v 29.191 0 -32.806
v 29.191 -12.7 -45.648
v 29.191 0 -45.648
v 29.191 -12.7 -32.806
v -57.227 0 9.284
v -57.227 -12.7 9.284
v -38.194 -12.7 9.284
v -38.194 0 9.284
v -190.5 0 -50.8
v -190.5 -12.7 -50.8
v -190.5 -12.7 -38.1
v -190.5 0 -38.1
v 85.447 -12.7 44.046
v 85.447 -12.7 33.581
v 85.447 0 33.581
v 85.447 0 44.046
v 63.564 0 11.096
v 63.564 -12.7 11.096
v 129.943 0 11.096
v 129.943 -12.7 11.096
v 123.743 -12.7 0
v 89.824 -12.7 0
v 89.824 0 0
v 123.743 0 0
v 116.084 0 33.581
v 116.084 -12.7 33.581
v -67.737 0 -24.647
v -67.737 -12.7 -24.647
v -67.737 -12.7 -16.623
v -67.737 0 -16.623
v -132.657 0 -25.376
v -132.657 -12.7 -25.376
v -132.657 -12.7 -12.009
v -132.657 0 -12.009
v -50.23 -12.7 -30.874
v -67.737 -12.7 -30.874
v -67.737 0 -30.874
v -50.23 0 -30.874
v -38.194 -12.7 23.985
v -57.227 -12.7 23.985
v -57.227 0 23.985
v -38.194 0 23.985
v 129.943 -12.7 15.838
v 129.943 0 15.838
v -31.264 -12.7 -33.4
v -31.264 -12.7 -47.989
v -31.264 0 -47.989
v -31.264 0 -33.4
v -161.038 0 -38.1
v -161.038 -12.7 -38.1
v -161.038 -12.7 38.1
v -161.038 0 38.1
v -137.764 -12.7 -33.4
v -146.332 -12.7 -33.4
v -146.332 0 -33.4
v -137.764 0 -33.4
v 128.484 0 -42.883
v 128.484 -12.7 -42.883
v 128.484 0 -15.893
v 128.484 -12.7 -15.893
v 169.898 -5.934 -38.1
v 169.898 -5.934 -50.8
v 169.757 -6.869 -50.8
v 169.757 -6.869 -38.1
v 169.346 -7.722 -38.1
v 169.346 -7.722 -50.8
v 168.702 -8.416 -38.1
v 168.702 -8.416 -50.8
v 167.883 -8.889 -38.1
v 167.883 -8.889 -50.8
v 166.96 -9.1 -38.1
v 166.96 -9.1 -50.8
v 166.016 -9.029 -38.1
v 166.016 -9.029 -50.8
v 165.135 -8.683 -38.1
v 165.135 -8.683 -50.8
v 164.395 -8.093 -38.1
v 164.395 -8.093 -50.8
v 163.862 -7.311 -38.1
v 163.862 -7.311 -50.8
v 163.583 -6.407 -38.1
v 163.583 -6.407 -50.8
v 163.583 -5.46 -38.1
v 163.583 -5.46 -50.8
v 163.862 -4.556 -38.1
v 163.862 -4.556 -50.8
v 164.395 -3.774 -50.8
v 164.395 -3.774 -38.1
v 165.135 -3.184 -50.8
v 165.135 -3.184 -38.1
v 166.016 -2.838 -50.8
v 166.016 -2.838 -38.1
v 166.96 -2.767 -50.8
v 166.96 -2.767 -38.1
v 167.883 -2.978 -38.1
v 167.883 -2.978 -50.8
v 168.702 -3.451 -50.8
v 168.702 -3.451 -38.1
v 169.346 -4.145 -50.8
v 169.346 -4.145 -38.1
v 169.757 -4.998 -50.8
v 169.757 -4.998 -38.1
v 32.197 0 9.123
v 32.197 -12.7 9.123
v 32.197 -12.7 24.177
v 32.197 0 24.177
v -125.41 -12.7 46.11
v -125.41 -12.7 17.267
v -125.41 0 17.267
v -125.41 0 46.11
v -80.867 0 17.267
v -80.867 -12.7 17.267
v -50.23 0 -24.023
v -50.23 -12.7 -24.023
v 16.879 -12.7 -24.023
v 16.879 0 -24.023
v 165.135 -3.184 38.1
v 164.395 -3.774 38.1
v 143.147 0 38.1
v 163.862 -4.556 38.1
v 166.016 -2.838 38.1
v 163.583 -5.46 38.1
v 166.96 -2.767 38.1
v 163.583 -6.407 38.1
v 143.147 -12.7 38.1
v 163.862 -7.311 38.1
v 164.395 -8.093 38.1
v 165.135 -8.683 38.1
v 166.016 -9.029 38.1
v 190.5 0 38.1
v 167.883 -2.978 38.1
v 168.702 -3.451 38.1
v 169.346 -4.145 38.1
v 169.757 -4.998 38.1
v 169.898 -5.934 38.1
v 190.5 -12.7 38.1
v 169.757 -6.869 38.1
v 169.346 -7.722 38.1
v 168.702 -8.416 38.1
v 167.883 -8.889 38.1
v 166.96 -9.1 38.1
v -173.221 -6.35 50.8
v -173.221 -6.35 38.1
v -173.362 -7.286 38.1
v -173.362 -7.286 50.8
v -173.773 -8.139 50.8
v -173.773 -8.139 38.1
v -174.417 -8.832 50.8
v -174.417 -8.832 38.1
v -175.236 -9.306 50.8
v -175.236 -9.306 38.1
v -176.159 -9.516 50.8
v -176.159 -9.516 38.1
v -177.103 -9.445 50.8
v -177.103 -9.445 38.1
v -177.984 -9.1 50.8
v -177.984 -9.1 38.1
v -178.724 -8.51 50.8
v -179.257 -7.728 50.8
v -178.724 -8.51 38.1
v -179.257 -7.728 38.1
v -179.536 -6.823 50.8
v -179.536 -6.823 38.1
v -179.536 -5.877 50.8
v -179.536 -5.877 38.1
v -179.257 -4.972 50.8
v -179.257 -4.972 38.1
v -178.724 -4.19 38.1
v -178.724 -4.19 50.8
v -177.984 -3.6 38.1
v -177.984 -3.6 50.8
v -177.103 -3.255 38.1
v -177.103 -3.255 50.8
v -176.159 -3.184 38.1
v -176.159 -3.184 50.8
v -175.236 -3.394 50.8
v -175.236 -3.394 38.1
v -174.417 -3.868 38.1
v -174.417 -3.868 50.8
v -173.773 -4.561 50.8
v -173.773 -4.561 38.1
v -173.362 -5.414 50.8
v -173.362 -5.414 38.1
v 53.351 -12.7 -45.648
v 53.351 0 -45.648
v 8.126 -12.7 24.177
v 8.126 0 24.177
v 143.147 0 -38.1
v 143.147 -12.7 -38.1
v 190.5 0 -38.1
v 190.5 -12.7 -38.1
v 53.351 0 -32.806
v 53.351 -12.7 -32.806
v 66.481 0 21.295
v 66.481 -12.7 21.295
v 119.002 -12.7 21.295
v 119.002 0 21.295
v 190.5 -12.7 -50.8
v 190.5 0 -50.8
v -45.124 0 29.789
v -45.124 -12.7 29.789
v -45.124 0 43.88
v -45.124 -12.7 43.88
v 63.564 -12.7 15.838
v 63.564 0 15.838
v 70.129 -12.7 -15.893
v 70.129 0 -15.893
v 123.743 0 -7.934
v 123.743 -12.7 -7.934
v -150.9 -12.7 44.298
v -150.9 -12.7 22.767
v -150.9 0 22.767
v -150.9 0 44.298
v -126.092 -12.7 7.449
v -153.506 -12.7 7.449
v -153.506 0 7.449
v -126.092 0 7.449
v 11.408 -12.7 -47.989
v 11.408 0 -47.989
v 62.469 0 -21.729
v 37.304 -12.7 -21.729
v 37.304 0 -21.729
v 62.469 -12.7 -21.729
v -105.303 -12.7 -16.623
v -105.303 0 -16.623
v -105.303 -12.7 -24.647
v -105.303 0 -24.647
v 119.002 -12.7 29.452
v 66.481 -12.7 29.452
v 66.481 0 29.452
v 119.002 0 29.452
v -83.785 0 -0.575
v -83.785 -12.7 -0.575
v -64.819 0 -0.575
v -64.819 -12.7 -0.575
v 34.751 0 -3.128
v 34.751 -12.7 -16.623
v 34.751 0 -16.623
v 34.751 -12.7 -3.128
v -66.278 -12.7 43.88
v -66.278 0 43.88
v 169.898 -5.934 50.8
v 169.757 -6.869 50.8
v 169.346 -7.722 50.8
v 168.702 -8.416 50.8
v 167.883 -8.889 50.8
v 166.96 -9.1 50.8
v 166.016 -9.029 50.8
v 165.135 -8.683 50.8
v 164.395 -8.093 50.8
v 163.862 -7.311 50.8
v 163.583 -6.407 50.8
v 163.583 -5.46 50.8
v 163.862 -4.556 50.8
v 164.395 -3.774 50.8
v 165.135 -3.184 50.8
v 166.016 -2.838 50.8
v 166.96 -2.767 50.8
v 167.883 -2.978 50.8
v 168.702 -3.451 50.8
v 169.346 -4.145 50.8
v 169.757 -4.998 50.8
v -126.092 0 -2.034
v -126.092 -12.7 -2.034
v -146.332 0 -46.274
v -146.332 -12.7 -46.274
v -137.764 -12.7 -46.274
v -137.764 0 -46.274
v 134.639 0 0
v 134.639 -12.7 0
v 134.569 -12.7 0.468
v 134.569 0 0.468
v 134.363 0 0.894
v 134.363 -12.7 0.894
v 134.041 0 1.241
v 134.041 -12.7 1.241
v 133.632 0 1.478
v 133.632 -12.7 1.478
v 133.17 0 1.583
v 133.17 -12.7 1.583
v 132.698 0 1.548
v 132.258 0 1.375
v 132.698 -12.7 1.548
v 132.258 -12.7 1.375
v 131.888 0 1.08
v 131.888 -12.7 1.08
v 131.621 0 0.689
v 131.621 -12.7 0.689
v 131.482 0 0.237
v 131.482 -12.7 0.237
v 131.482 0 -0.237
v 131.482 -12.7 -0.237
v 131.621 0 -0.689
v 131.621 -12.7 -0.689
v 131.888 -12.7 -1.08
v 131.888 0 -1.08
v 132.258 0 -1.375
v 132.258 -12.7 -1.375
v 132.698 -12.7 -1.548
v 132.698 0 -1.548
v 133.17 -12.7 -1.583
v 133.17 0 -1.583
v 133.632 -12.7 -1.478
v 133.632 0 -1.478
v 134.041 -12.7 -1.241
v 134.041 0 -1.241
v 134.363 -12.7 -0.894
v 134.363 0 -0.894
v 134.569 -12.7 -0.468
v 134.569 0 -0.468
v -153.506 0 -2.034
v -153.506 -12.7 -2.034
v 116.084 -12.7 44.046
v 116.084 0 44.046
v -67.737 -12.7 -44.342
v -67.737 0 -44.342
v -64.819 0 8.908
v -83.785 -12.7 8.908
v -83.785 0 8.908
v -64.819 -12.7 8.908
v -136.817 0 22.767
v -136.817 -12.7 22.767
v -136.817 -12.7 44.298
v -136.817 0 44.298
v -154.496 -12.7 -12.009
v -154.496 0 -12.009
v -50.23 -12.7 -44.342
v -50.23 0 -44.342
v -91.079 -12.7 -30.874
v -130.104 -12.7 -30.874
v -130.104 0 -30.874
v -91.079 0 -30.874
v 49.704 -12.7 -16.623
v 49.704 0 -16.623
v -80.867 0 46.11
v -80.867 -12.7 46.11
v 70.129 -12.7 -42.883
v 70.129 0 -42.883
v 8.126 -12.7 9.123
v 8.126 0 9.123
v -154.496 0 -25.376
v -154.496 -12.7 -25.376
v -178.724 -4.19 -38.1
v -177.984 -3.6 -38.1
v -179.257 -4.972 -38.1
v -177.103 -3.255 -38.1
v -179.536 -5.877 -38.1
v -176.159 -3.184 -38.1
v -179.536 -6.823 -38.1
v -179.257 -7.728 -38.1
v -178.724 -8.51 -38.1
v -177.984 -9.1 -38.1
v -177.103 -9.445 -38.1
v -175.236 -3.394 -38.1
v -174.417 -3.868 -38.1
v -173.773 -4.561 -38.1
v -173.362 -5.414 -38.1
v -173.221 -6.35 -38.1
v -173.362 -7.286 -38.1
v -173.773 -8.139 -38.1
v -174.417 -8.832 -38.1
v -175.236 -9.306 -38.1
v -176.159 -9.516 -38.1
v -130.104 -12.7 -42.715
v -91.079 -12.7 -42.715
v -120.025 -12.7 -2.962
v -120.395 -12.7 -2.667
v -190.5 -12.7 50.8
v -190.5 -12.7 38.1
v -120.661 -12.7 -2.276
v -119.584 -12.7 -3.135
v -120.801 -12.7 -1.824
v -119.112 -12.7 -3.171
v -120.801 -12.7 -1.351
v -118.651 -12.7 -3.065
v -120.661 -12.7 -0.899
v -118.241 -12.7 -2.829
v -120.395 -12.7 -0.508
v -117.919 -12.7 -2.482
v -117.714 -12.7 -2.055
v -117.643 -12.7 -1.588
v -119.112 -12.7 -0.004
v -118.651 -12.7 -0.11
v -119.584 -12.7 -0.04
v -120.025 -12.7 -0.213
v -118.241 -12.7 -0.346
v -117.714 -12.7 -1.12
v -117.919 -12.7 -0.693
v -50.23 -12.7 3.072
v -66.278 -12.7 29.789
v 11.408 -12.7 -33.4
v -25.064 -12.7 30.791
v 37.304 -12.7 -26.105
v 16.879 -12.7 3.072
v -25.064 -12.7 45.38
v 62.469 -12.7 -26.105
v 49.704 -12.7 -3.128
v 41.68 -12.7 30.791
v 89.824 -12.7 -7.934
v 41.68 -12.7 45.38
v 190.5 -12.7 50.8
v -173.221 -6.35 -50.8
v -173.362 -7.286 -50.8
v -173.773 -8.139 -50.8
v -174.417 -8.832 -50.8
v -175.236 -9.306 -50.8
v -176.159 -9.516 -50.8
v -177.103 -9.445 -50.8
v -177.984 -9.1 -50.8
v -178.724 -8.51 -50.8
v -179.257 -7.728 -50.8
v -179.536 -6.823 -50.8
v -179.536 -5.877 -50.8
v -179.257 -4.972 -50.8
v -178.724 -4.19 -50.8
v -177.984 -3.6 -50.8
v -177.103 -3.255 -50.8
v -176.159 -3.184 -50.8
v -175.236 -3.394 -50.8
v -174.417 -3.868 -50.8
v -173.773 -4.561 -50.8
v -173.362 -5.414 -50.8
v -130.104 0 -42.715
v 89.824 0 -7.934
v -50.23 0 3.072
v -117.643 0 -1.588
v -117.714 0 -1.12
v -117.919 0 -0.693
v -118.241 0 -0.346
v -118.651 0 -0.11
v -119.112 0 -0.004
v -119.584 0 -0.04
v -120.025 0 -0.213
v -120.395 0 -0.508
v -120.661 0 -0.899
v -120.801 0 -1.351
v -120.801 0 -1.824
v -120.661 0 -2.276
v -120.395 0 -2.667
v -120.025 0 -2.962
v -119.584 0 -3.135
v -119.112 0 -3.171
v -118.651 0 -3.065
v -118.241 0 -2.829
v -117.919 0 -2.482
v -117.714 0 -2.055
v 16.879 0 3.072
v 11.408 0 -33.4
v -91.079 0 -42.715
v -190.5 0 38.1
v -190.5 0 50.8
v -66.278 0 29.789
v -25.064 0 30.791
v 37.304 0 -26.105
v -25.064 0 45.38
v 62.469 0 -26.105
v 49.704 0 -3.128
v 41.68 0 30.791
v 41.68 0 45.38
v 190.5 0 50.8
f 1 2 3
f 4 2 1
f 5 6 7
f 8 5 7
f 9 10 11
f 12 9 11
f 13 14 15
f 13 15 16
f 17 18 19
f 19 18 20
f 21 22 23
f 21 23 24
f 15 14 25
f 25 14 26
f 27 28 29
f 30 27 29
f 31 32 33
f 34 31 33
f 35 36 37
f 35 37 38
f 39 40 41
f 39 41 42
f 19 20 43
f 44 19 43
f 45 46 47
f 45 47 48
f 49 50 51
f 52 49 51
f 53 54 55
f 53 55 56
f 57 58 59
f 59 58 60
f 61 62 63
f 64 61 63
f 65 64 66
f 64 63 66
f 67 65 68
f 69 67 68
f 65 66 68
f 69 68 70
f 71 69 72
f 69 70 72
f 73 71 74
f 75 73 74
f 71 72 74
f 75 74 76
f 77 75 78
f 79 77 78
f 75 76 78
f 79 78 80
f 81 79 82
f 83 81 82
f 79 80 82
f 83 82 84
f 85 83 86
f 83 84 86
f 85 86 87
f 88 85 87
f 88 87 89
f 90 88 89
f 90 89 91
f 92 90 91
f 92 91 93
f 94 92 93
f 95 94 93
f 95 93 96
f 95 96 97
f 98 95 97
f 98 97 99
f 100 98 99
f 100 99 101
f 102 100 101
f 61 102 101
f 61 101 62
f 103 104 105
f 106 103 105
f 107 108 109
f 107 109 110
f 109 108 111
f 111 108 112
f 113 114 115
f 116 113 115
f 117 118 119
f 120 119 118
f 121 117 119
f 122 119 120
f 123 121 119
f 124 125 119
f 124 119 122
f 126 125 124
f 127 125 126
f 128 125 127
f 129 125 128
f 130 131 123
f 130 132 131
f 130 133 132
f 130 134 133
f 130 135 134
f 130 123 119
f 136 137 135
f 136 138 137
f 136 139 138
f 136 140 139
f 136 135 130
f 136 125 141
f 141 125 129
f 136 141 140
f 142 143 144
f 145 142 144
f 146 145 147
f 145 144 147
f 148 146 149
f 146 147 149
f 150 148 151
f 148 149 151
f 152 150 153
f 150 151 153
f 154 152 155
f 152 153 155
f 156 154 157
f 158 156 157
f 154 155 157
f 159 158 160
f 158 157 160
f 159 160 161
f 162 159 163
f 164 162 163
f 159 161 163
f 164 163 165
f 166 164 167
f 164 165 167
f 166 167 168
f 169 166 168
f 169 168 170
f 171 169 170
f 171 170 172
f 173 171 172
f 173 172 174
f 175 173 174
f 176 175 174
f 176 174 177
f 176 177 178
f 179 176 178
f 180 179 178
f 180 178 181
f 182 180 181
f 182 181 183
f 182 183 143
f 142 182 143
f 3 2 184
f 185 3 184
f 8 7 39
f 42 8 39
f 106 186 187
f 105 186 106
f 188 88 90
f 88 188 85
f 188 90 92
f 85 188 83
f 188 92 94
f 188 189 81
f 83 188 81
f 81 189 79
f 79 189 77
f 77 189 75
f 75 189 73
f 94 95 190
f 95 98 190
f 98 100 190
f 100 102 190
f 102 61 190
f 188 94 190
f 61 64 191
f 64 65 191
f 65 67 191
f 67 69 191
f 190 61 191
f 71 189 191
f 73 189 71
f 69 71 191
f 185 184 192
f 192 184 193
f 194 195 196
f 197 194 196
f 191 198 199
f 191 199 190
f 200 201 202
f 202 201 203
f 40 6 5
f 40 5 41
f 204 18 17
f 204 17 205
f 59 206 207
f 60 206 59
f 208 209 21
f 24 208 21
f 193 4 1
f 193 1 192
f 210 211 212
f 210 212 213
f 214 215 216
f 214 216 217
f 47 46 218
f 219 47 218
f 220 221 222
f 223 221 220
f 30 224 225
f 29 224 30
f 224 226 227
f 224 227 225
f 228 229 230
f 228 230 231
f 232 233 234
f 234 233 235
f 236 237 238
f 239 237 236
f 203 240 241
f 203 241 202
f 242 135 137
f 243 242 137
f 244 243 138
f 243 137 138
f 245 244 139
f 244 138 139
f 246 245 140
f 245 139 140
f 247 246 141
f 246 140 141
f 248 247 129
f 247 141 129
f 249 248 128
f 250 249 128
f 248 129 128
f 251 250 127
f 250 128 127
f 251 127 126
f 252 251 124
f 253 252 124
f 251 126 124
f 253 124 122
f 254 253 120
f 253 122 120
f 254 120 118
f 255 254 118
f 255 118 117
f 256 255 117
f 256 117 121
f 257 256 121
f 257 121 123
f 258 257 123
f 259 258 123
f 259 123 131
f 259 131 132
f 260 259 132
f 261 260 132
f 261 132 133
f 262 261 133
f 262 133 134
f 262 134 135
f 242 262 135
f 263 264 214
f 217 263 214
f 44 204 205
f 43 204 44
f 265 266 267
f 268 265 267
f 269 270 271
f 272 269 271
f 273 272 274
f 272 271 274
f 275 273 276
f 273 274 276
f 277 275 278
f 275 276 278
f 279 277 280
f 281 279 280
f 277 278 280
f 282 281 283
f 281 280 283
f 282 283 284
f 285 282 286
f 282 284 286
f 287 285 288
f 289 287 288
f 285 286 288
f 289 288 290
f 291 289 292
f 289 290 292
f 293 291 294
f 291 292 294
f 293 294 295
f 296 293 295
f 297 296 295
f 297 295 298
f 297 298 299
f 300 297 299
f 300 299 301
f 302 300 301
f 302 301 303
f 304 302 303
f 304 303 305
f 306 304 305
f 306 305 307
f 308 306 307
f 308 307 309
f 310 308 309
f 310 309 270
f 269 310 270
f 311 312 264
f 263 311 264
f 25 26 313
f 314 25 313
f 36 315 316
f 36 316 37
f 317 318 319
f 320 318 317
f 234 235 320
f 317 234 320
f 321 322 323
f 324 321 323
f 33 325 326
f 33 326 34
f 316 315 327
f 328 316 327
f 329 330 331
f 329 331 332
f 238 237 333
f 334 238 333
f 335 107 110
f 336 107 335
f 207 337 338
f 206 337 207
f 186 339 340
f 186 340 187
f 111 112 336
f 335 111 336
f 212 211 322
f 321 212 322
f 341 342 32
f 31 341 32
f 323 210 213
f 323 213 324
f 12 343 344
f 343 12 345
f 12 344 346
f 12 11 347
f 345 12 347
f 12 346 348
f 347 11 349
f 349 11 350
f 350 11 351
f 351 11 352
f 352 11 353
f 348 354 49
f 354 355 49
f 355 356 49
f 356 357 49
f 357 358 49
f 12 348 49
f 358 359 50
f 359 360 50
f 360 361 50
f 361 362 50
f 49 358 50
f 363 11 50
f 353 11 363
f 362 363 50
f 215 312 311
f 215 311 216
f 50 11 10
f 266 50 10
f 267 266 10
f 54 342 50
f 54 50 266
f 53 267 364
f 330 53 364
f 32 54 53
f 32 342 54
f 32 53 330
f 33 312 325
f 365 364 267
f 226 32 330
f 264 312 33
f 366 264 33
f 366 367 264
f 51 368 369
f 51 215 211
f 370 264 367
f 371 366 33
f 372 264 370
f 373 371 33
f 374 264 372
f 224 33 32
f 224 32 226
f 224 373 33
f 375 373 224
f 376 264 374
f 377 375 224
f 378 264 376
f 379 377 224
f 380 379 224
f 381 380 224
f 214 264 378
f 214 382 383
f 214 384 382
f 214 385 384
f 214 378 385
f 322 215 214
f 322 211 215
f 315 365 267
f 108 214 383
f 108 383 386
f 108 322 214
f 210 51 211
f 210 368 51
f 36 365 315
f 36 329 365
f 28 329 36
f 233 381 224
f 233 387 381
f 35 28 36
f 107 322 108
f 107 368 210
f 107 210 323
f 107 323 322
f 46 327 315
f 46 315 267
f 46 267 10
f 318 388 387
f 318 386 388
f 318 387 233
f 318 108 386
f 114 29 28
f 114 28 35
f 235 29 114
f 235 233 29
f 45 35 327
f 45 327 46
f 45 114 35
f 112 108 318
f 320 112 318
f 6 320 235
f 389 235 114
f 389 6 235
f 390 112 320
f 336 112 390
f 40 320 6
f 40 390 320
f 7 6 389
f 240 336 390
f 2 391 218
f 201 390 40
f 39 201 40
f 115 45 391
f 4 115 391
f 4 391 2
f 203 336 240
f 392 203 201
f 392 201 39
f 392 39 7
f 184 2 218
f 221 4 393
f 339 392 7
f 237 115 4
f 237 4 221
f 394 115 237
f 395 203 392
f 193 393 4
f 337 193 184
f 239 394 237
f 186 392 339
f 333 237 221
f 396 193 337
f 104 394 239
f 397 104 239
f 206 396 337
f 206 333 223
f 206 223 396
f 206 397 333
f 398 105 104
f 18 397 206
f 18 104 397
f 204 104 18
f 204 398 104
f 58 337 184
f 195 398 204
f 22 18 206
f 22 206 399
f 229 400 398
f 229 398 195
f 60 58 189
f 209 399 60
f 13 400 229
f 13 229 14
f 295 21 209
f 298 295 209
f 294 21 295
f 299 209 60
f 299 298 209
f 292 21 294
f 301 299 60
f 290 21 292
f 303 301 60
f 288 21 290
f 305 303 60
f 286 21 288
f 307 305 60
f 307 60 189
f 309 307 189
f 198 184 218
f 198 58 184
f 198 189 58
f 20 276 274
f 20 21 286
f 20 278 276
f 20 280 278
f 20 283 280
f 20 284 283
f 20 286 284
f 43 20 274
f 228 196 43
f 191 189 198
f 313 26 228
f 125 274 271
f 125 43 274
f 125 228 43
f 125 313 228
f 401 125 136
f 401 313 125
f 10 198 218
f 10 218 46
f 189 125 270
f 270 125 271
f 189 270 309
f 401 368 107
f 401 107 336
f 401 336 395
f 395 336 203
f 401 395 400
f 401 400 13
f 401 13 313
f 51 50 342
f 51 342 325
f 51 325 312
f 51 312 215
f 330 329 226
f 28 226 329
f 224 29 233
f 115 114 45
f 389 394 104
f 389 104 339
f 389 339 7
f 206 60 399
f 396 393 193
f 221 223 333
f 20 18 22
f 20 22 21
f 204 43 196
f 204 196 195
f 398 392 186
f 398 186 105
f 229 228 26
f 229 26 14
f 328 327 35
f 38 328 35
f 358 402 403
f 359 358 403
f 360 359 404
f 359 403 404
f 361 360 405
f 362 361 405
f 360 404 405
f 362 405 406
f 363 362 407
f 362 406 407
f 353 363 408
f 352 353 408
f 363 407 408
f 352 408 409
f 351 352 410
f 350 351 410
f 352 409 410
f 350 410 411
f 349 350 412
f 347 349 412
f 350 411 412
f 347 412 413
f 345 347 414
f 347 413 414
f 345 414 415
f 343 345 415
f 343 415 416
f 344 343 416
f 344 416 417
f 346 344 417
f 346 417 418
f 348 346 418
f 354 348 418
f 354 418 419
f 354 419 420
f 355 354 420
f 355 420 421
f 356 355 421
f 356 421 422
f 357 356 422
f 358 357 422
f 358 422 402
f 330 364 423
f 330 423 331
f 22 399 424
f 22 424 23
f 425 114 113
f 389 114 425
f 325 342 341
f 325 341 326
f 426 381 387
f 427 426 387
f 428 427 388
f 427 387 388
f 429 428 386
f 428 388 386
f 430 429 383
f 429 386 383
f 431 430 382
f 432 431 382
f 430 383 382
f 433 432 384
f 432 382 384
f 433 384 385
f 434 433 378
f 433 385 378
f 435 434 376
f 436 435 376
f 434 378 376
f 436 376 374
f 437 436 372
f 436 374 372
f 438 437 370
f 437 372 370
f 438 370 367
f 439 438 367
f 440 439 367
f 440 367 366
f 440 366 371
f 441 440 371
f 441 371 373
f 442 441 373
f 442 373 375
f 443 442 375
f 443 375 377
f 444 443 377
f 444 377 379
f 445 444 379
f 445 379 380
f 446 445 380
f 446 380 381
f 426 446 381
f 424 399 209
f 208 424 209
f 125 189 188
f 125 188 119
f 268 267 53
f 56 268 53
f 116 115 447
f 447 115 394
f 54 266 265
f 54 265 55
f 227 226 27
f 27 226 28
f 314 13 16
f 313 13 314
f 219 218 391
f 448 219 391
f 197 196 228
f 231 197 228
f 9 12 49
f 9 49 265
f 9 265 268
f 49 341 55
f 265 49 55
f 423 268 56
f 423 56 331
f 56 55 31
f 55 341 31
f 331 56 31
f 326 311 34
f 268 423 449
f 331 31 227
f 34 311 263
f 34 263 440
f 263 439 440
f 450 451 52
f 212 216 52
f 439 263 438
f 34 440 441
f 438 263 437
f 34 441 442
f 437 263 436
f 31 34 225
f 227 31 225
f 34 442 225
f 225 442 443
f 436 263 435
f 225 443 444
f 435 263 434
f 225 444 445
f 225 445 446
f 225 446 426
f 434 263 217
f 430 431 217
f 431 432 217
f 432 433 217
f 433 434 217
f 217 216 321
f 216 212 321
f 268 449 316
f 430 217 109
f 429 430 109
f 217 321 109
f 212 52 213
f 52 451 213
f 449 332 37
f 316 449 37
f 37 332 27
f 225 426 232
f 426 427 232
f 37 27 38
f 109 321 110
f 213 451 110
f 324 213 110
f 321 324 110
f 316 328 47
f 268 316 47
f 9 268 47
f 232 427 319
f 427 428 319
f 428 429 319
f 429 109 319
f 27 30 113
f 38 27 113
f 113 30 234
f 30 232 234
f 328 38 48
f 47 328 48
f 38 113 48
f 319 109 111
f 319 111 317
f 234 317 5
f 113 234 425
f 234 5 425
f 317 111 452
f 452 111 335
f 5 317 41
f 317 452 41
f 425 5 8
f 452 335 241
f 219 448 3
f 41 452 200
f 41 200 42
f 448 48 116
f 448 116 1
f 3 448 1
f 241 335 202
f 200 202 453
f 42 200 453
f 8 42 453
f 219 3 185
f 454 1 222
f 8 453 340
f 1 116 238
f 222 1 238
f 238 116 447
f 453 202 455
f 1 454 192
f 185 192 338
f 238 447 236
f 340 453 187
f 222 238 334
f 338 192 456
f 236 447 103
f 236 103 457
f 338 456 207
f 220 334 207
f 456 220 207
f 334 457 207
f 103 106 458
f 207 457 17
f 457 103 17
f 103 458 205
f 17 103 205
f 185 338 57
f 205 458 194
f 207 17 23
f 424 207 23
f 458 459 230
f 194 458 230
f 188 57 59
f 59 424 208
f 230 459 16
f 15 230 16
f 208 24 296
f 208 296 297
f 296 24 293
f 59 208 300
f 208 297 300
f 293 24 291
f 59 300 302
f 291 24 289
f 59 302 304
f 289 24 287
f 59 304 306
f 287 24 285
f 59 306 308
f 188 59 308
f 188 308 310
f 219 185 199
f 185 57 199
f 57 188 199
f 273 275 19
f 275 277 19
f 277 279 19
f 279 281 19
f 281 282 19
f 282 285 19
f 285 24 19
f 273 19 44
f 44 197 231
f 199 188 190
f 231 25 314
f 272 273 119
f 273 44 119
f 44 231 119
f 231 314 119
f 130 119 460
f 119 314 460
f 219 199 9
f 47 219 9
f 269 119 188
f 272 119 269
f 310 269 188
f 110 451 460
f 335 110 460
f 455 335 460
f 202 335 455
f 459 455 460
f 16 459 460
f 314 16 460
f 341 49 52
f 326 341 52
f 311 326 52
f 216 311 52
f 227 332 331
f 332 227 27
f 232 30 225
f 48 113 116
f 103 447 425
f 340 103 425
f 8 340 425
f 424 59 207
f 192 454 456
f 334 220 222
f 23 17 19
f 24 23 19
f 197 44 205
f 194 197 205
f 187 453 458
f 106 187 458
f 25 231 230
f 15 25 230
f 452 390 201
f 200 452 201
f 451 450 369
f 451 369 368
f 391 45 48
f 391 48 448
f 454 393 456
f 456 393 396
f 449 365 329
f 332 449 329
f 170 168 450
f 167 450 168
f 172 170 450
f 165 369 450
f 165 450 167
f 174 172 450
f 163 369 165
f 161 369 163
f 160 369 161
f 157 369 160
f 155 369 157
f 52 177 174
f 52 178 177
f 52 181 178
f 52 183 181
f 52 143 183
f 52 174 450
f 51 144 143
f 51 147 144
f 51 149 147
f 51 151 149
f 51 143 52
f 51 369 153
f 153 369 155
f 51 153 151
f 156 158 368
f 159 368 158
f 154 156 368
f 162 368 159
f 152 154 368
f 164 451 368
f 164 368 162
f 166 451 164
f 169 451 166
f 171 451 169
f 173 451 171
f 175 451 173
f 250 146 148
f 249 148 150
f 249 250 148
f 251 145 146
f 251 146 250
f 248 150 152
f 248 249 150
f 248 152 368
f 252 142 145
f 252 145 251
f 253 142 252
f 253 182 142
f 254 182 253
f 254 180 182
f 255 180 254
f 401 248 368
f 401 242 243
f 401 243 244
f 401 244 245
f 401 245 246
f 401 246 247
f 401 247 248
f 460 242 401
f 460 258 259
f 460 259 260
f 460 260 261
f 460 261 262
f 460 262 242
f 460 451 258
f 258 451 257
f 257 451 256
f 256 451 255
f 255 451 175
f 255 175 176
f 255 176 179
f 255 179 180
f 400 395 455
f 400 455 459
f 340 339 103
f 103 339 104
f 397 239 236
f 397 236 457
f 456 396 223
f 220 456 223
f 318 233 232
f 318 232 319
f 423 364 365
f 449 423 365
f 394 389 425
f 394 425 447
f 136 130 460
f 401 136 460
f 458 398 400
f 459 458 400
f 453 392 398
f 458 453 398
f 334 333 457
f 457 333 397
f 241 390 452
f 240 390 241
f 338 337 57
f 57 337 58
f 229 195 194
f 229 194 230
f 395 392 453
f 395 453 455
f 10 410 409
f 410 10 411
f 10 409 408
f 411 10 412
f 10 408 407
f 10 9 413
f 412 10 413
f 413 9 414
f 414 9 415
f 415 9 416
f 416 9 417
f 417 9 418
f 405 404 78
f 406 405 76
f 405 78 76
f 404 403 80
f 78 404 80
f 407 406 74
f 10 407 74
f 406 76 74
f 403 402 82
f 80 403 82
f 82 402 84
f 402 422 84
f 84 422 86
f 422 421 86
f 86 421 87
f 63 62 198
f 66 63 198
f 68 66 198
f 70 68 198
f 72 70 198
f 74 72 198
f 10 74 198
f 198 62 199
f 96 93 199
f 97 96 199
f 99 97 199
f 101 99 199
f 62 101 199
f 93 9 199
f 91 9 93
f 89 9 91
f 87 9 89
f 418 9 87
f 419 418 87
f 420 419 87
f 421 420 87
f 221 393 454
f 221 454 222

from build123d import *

# Parameters (mm, degrees)
F0_W     = 381
F0_H     = 101.6
F1_DEPTH = 12.7
F2_W     = 44.543445
F2_H     = 28.842324
F2_W_2   = 27.413249
F2_H_2   = 9.482801
F2_W_3   = 39.025373
F2_H_3   = 11.841384
F2_W_4   = 67.109051
F2_H_4   = 27.095137
F2_W_5   = 66.744328
F2_H_5   = 14.588922
F2_W_6   = 18.965602
F2_W_7   = 37.566483
F2_H_6   = 8.023907
F2_W_8   = 42.672605
F2_H_7   = 14.588925
F2_W_9   = 17.506707
F2_H_8   = 13.468034
F2_W_10  = 8.568198
F2_H_9   = 12.874041
F2_W_11  = 21.838954
F2_H_10  = 13.367074
F2_W_12  = 14.083162
F2_H_11  = 21.530468
F2_W_13  = 19.033331
F2_H_12  = 14.701502
F2_W_14  = 66.379599
F2_H_13  = 4.741401
F2_W_15  = 58.355704
F2_H_14  = 26.989511
F2_W_16  = 25.165893
F2_H_15  = 4.376677
F2_W_17  = 30.636735
F2_H_16  = 10.46557
F2_W_18  = 52.520126
F2_H_17  = 8.157725
F2_W_19  = 33.919238
F2_H_18  = 7.933862
F2_W_20  = 14.953643
F2_H_19  = 13.494756
F2_W_21  = 24.07172
F2_H_20  = 15.053647
F2_W_22  = 21.153938
F2_H_21  = 14.091857
F2_W_23  = 47.352944
F2_H_22  = 76.2
F2_W_24  = 24.159947
F2_H_23  = 12.841732
F2_W_25  = 29.462242
F3_DEPTH = 12.701
F4_R     = 3.175
F5_DEPTH = 101.601
F6_R     = 1.5875
F7_DEPTH = 12.701


with BuildPart() as f1:
    # F0 (on Front) → F1 (new body)
    with BuildSketch(Plane.XZ):
        Rectangle(F0_W, F0_H)
    extrude(amount=F1_DEPTH)

    # F2 (on face) → F3 (cut, through all)
    with BuildSketch(Plane.XZ.offset(12.7)):
        with Locations((-103.138441, 31.688611)):
            Rectangle(F2_W, F2_H)
        with Locations((-139.799008, 2.707727)):
            Rectangle(F2_W_2, F2_H_2)
        with Locations((-110.591656, -36.794207)):
            Rectangle(F2_W_3, F2_H_3)
        with Locations((-16.675455, -10.475118)):
            Rectangle(F2_W_4, F2_H_4)
        with Locations((8.308077, 38.085867)):
            Rectangle(F2_W_5, F2_H_5)
        with Locations((-74.301707, 4.166619)):
            Rectangle(F2_W_6, F2_H_2)
        with Locations((-86.519928, -20.634552)):
            Rectangle(F2_W_7, F2_H_6)
        with Locations((-9.928079, -40.694322)):
            Rectangle(F2_W_8, F2_H_7)
        with Locations((-58.983334, -37.607532)):
            Rectangle(F2_W_9, F2_H_8)
        with Locations((-142.047623, -39.836879)):
            Rectangle(F2_W_10, F2_H_9)
        with Locations((-143.57688, -18.692414)):
            Rectangle(F2_W_11, F2_H_10)
        with Locations((-143.858196, 33.532733)):
            Rectangle(F2_W_12, F2_H_11)
        with Locations((-47.710783, 16.634559)):
            Rectangle(F2_W_13, F2_H_12)
        with Locations((96.753428, 13.467059)):
            Rectangle(F2_W_14, F2_H_13)
        with Locations((99.306492, -29.387906)):
            Rectangle(F2_W_15, F2_H_14)
        with Locations((49.886511, -23.91706)):
            Rectangle(F2_W_16, F2_H_15)
        with Locations((100.765379, 38.81371)):
            Rectangle(F2_W_17, F2_H_16)
        with Locations((92.741473, 25.373465)):
            Rectangle(F2_W_18, F2_H_17)
        with Locations((106.78331, -3.966931)):
            Rectangle(F2_W_19, F2_H_18)
        with Locations((42.227322, -9.87522)):
            Rectangle(F2_W_20, F2_H_19)
        with Locations((20.161576, 16.649821)):
            Rectangle(F2_W_21, F2_H_20)
        with Locations((-55.700827, 36.834504)):
            Rectangle(F2_W_22, F2_H_21)
        with Locations((166.823528, 0)):
            Rectangle(F2_W_23, F2_H_22)
        with Locations((41.271404, -39.226733)):
            Rectangle(F2_W_24, F2_H_23)
        with Locations((-175.768879, 0)):
            Rectangle(F2_W_25, F2_H_22)
    extrude(amount=-F3_DEPTH, mode=Mode.SUBTRACT)

    # F4 (on face) → F5 (cut, through all)
    with BuildSketch(Plane(origin=(0, 0, -50.8), x_dir=(1, 0, 0), z_dir=(0, 0, -1))):
        with Locations((166.722789, 5.933621)):
            Circle(F4_R)
        with Locations((-176.396297, 6.35)):
            Circle(F4_R)
    extrude(amount=-F5_DEPTH, mode=Mode.SUBTRACT)

    # F6 (on face) → F7 (cut, through all)
    with BuildSketch(Plane.XZ.offset(12.7)):
        with Locations((-119.230784, -1.5875)):
            Circle(F6_R)
        with Locations((133.051559, 0)):
            Circle(F6_R)
    extrude(amount=-F7_DEPTH, mode=Mode.SUBTRACT)


solid = f1.part
